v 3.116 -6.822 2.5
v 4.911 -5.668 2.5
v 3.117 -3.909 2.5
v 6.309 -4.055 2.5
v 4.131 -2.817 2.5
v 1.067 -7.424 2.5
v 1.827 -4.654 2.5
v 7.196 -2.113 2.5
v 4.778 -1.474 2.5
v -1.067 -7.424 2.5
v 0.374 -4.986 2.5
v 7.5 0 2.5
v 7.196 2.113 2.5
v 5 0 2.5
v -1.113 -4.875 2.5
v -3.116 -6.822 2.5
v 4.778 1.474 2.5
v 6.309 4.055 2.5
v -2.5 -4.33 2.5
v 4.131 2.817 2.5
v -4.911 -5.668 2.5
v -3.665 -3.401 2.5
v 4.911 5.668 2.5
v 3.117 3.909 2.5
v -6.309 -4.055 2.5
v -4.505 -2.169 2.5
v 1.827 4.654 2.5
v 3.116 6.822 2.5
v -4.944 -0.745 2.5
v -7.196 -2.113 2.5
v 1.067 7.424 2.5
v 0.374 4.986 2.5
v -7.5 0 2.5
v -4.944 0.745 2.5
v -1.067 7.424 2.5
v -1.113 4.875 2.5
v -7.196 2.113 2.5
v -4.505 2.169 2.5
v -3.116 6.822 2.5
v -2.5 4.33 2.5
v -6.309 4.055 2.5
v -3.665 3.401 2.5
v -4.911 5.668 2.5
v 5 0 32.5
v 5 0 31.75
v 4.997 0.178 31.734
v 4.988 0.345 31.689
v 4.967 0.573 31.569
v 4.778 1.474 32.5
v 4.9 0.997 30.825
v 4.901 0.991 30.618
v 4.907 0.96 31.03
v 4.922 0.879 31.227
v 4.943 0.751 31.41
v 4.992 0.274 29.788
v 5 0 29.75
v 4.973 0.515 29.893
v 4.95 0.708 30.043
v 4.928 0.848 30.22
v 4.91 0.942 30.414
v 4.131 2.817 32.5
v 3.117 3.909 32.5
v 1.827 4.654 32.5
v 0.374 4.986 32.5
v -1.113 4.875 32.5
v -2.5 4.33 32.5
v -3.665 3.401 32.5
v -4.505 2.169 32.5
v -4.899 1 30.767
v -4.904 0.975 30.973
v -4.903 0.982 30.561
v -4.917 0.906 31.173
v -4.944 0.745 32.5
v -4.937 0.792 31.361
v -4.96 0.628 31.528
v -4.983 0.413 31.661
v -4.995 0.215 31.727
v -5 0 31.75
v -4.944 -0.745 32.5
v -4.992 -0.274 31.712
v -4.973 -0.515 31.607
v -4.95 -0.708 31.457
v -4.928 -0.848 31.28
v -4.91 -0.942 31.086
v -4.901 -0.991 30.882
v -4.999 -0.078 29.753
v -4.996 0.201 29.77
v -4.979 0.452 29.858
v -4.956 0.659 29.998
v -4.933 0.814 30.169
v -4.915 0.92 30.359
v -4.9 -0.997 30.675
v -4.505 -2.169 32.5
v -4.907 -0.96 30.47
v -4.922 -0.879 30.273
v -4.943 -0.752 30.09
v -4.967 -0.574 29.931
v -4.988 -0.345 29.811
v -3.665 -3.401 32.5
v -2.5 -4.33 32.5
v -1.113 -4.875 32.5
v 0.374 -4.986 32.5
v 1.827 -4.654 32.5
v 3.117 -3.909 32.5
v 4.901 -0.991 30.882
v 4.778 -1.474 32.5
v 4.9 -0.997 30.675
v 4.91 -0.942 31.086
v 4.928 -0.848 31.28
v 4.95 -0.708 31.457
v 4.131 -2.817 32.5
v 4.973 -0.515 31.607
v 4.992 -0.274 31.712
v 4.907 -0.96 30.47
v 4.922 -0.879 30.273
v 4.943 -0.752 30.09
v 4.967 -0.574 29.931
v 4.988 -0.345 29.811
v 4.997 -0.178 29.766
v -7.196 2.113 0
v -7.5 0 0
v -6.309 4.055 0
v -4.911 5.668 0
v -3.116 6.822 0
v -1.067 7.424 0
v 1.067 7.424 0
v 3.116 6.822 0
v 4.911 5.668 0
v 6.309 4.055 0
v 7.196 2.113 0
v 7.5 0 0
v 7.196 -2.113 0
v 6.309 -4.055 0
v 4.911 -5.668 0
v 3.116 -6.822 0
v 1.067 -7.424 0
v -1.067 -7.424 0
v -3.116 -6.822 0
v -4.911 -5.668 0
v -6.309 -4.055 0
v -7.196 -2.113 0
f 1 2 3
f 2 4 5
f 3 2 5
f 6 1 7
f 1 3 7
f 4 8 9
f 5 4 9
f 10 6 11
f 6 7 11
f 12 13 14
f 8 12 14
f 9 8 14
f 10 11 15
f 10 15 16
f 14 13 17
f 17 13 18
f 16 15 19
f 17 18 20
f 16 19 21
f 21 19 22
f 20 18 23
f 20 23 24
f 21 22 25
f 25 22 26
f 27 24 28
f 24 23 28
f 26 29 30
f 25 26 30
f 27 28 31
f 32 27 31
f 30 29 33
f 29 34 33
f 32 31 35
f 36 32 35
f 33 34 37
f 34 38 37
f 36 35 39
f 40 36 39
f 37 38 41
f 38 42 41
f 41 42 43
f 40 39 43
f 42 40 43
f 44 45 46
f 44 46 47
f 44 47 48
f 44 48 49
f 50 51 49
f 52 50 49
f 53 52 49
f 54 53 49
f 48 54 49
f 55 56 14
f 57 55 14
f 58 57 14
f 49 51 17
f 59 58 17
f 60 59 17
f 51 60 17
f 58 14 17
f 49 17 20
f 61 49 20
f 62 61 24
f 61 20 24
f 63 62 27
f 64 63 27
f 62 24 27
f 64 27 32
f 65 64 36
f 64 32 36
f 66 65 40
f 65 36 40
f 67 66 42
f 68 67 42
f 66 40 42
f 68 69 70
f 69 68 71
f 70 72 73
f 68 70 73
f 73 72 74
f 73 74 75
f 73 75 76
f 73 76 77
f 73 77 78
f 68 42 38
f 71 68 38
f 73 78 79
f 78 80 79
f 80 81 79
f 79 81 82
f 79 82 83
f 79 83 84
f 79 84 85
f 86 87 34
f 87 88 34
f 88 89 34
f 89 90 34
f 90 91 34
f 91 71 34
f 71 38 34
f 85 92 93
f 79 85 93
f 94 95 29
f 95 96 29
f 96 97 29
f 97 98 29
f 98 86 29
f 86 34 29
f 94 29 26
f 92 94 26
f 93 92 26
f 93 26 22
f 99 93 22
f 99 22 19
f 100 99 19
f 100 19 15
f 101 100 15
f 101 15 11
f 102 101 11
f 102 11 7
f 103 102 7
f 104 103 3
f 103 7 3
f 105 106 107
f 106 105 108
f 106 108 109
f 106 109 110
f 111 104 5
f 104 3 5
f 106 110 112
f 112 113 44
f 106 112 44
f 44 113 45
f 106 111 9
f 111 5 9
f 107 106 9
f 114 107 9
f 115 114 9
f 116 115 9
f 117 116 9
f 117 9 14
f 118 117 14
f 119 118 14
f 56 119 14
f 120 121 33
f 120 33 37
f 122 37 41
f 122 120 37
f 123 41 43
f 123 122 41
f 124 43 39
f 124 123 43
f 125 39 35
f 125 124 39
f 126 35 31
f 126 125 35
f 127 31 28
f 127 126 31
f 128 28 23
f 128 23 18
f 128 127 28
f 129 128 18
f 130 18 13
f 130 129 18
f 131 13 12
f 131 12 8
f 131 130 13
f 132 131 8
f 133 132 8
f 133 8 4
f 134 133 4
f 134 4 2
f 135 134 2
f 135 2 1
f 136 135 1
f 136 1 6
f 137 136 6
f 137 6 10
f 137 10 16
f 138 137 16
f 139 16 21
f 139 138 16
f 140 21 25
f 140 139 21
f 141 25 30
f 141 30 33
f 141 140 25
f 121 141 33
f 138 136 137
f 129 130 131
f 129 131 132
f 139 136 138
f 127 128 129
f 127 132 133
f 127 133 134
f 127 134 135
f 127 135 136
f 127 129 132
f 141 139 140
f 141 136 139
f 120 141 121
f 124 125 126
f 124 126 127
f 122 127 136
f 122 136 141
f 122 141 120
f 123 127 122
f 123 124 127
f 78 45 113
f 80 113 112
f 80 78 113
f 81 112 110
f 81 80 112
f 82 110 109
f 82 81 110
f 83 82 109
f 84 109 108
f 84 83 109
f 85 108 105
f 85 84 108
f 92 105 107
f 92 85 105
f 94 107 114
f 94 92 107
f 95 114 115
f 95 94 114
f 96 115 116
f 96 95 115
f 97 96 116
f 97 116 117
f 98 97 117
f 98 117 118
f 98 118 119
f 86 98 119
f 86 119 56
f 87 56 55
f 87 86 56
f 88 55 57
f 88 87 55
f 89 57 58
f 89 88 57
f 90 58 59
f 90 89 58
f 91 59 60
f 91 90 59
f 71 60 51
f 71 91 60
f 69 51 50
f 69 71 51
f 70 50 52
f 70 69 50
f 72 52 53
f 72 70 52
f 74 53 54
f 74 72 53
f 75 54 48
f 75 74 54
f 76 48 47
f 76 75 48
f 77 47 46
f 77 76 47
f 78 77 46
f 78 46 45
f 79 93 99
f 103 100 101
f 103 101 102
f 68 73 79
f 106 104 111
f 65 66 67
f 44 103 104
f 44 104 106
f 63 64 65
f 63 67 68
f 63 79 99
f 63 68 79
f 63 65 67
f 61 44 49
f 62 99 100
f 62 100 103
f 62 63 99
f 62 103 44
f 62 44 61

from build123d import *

# Parameters (mm, degrees)
SKETCH1_R               = 10
BOSS_EXTRUDE1_DEPTH     = 65
CUT_EXTRUDE1_DEPTH      = 18
CUT_EXTRUDE1_DEPTH_BACK = 16
SKETCH2_R               = 2
SKETCH5_R               = 15
BOSS_EXTRUDE3_DEPTH     = 5
SCALE1_SCALE            = 0.5


with BuildPart() as part:
    # Sketch1 → Boss-Extrude1 (new body)
    with BuildSketch(Plane.XY):
        Circle(SKETCH1_R)
    extrude(amount=BOSS_EXTRUDE1_DEPTH)

    # Sketch2 → Cut-Extrude1 (cut, two sides: drawn at the far end of the back side and taken through both)
    with BuildSketch(Plane(origin=(0, 0, 0), x_dir=(0, 0, -1), z_dir=(1, 0, 0)).offset(-CUT_EXTRUDE1_DEPTH_BACK)):
        with Locations(Location((-61.5, 0, 0), (0, 0, 180))):
            Circle(SKETCH2_R)
    extrude(amount=CUT_EXTRUDE1_DEPTH + CUT_EXTRUDE1_DEPTH_BACK, mode=Mode.SUBTRACT)

    # Sketch5 → Boss-Extrude3 (add)
    with BuildSketch(Plane(origin=(0, 0, 0), x_dir=(-1, 0, 0), z_dir=(0, 0, -1))):
        Circle(SKETCH5_R)
    extrude(amount=-BOSS_EXTRUDE3_DEPTH)


with BuildPart() as part_1:
    # Scale1: scaled about (0, 0, 0)
    add(part.part.scale(SCALE1_SCALE))


solid = part_1.part
